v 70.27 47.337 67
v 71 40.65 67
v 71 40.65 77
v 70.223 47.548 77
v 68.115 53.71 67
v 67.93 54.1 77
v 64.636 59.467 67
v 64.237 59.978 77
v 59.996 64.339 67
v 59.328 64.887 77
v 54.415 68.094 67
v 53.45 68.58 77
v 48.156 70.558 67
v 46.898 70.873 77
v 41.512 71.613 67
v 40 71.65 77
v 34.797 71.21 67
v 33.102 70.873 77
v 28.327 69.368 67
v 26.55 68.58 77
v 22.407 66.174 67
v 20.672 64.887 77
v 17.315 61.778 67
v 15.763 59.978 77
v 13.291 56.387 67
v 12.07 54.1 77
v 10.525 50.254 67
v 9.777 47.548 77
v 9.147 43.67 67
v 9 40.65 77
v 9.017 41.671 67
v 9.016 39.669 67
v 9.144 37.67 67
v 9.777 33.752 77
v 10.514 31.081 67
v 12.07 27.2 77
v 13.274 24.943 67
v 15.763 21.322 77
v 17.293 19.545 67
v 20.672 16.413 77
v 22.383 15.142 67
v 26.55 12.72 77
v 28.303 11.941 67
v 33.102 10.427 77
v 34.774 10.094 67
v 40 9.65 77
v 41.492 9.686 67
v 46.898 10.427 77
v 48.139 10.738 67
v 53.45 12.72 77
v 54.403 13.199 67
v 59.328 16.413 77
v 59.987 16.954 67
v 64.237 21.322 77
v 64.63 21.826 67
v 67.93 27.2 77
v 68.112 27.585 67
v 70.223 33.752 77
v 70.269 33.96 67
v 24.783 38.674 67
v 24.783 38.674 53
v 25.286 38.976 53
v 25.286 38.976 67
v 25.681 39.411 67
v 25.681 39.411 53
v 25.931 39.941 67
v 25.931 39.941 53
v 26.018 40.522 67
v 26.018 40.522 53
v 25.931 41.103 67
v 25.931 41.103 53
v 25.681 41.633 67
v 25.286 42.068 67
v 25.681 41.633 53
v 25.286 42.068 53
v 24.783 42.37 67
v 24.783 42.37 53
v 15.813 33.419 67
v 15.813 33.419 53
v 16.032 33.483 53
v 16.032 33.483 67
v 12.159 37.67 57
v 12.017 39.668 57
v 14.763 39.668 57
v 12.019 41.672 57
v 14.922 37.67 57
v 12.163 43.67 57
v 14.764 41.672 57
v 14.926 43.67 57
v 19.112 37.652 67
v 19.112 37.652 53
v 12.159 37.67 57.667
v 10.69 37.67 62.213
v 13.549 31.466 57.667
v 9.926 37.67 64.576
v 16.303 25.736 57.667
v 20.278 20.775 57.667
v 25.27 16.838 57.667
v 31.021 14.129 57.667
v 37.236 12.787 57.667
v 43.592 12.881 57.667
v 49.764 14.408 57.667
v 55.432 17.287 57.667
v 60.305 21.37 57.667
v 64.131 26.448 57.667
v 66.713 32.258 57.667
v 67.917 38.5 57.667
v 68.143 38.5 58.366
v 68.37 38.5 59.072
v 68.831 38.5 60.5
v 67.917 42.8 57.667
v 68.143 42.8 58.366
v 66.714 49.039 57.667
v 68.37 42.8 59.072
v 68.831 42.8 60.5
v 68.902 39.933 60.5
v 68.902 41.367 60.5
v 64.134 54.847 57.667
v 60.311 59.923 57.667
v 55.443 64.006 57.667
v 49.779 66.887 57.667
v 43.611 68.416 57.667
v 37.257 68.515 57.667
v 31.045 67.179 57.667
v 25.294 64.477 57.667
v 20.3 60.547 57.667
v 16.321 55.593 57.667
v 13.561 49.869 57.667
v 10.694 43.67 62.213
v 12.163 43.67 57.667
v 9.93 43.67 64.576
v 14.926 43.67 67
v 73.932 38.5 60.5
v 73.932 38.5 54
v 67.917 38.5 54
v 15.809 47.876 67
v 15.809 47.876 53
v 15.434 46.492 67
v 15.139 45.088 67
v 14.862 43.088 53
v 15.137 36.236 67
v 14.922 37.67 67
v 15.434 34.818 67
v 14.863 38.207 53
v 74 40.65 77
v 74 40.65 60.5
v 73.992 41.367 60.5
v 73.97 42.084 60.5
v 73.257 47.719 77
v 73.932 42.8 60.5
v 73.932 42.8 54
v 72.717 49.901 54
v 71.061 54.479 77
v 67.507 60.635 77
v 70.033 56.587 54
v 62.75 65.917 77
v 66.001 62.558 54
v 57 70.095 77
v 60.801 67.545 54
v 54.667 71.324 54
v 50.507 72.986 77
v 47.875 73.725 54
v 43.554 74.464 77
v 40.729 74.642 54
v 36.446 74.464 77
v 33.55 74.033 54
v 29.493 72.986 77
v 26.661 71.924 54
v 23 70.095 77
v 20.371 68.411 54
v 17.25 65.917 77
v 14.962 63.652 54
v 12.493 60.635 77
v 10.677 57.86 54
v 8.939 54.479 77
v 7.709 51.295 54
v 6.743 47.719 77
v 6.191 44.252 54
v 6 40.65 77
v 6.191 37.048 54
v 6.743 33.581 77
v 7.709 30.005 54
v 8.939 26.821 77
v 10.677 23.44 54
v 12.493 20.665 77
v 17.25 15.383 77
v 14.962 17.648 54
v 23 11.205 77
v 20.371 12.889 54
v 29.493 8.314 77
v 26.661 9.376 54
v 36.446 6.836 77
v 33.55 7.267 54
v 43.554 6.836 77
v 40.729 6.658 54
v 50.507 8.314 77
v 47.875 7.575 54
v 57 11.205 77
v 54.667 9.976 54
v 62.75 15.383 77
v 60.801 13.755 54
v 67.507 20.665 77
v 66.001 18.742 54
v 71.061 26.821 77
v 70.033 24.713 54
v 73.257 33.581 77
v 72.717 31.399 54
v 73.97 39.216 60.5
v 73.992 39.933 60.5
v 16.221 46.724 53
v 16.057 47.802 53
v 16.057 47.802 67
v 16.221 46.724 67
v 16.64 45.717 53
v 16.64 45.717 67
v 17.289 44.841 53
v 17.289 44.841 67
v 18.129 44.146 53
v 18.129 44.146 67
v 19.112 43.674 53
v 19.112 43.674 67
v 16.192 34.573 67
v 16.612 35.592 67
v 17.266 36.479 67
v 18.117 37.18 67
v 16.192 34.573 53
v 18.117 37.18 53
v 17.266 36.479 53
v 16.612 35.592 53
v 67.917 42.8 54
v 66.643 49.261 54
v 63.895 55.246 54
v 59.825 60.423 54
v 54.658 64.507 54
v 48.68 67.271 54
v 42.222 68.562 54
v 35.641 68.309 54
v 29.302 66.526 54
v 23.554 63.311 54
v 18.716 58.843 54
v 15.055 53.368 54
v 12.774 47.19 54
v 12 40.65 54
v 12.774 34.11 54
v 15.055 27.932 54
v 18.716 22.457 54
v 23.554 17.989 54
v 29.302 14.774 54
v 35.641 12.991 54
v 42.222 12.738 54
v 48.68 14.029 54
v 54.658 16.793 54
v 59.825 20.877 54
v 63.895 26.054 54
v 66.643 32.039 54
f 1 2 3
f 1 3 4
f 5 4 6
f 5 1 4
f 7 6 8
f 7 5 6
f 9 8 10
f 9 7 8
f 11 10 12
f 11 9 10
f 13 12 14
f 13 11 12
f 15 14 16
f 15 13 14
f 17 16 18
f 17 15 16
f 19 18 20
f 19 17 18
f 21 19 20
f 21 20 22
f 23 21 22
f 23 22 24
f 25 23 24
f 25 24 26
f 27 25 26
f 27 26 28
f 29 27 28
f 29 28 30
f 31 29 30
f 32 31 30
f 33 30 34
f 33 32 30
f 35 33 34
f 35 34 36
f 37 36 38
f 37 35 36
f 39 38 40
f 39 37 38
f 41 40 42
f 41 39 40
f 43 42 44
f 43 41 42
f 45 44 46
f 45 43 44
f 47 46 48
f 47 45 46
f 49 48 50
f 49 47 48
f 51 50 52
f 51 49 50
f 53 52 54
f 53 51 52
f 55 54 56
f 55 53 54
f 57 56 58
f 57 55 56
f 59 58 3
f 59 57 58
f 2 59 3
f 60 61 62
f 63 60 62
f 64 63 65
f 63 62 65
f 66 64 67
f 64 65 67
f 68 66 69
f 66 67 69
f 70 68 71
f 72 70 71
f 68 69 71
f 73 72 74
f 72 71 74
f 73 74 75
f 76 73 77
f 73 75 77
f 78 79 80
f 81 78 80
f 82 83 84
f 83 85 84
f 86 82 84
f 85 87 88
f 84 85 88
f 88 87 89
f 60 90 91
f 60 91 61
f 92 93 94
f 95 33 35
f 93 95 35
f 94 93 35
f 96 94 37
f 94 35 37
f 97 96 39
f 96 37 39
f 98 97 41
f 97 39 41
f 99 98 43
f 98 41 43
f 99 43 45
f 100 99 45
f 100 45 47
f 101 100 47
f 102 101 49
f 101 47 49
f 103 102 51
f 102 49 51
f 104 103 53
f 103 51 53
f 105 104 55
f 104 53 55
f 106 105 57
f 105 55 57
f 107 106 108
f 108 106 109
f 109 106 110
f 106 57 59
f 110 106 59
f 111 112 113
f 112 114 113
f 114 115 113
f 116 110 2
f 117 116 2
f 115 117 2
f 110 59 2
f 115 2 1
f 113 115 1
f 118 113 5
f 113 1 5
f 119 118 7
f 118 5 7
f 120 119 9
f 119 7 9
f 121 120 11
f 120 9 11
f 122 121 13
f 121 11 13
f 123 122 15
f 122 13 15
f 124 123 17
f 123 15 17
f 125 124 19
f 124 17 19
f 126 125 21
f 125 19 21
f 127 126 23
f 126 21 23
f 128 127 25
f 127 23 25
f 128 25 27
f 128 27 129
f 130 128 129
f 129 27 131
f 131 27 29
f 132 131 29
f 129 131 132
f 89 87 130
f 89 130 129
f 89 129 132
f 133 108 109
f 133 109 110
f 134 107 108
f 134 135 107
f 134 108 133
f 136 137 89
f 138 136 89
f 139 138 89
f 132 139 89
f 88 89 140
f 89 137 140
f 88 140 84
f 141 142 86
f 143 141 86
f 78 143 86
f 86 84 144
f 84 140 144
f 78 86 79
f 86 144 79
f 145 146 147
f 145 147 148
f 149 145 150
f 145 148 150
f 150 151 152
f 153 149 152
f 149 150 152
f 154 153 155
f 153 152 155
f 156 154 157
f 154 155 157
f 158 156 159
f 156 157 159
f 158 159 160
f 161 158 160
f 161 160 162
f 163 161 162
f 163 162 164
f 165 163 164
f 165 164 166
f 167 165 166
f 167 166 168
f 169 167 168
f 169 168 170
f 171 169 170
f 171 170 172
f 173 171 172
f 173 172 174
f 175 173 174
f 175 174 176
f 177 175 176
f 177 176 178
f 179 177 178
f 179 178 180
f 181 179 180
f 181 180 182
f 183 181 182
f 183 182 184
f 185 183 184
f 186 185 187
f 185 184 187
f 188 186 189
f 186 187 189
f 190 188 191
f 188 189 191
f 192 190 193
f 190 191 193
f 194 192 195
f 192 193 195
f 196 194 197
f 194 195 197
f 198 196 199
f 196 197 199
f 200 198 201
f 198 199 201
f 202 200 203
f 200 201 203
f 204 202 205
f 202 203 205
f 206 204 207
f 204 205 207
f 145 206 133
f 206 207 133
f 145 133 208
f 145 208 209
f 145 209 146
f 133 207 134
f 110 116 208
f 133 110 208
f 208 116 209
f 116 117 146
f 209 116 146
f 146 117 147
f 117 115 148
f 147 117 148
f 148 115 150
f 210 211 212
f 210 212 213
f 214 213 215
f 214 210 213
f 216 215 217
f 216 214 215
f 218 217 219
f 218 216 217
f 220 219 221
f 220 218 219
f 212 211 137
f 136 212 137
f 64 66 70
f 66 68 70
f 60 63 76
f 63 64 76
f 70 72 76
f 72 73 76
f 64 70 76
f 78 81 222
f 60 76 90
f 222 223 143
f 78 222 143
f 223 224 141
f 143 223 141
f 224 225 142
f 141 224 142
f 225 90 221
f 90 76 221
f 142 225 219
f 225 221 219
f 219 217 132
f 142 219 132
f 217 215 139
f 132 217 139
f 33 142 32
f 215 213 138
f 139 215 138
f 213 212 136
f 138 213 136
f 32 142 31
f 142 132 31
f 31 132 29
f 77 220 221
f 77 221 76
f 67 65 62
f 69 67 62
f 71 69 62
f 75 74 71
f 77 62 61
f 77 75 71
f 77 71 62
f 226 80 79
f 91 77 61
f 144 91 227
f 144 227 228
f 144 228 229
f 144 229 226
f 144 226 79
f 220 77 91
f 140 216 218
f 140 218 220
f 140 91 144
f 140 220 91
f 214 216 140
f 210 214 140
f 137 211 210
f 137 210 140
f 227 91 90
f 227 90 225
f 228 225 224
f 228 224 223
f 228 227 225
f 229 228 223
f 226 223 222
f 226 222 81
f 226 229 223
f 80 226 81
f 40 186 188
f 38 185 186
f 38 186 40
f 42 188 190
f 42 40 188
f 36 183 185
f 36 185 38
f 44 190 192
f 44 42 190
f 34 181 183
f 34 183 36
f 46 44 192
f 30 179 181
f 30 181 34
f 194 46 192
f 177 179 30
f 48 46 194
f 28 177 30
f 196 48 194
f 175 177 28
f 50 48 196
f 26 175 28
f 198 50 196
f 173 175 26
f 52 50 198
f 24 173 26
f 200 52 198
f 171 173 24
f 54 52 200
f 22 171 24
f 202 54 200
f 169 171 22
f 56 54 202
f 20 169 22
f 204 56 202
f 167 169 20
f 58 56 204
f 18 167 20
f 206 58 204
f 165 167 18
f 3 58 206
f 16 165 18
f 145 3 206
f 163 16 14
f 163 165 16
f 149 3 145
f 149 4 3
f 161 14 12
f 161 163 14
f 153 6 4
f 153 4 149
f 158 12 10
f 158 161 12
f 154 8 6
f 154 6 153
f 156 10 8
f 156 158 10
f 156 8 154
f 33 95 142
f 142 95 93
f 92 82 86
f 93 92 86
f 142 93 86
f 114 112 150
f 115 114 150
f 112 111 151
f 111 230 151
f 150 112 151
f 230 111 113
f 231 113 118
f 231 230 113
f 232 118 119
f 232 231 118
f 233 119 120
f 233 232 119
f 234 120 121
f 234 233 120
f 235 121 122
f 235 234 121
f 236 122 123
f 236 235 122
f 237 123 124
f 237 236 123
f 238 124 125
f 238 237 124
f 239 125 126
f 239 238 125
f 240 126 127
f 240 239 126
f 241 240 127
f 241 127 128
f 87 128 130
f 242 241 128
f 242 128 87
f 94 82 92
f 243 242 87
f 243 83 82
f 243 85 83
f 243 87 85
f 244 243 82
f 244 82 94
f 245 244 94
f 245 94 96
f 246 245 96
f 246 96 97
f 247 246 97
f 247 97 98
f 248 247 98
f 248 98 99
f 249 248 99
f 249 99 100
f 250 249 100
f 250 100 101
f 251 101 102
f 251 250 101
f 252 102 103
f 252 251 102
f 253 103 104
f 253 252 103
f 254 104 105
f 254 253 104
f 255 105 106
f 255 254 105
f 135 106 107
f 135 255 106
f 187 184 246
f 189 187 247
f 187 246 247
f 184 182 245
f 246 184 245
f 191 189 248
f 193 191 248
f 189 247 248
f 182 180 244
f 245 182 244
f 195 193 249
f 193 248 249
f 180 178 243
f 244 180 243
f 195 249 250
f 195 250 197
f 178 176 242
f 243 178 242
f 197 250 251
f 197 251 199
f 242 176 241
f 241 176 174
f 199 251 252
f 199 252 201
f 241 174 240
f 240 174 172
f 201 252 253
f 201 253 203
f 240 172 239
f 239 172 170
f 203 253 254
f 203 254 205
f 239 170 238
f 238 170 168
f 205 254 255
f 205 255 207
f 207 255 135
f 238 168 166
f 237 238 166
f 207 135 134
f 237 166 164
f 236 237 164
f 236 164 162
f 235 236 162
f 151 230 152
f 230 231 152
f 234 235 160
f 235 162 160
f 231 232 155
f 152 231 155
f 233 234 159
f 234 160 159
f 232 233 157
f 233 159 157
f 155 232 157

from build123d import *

# Parameters (mm, degrees)
BOX013_W          = 14
BOX013_H          = 4.3
BOX013_DEPTH      = 10
CYLINDER021_R     = 28
CYLINDER021_DEPTH = 4
CYLINDER019_R     = 34
CYLINDER019_DEPTH = 13
CYLINDER020_R     = 25
CYLINDER020_DEPTH = 13
TUBE_R            = 34
TUBE_R_2          = 31
TUBE_DEPTH        = 23
EXTRUDE001_DEPTH  = 14
BOX012_W          = 10
BOX012_H          = 6
BOX012_DEPTH      = 10


with BuildPart() as cube013:
    # Box013 → Box013 (new body)
    with BuildSketch(Plane(origin=(64, 38.5, 50.5), x_dir=(1, 0, 0), z_dir=(0, 0, 1))):
        with Locations((7, 2.15)):
            Rectangle(BOX013_W, BOX013_H)
    extrude(amount=BOX013_DEPTH)


with BuildPart() as cylinder021:
    # Cylinder021 → Cylinder021 (new body)
    with BuildSketch(Plane(origin=(40, 40.65, 54), x_dir=(1, 0, 0), z_dir=(0, 0, 1))):
        Circle(CYLINDER021_R)
    extrude(amount=CYLINDER021_DEPTH)


with BuildPart() as cone:
    # Cone → Cone (revolve)
    with BuildSketch(Plane(origin=(40, 40.65, 53), x_dir=(1, 0, 0), z_dir=(0, -1, 0))):
        Polygon((0, 0), (26.5, 0), (31, 14), (0, 14), align=None)
    revolve(axis=Axis((40, 40.65, 53), (0, 0, 1)))


with BuildPart() as cylinder019:
    # Cylinder019 → Cylinder019 (new body)
    with BuildSketch(Plane(origin=(40, 40.65, 54), x_dir=(1, 0, 0), z_dir=(0, 0, 1))):
        Circle(CYLINDER019_R)
    extrude(amount=CYLINDER019_DEPTH)


with BuildPart() as cylinder020:
    # Cylinder020 → Cylinder020 (new body)
    with BuildSketch(Plane(origin=(40, 39.2, 54), x_dir=(1, 0, 0), z_dir=(0, 0, 1))):
        Circle(CYLINDER020_R)
    extrude(amount=CYLINDER020_DEPTH)


with BuildPart() as cut016:
    # Tube → Tube (new body)
    with BuildSketch(Plane(origin=(40, 40.65, 54), x_dir=(1, 0, 0), z_dir=(0, 0, 1))):
        Circle(TUBE_R)
        Circle(TUBE_R_2, mode=Mode.SUBTRACT)
    extrude(amount=TUBE_DEPTH)

    # Fusion010: union Cylinder019, Cylinder020
    add(cylinder019.part)
    add(cylinder020.part)

    # Cut015: cut Cone
    add(cone.part, mode=Mode.SUBTRACT)

    # Cut016: cut Cylinder021
    add(cylinder021.part, mode=Mode.SUBTRACT)


with BuildPart() as extrude001:
    # Sketch001 → Extrude001 (new body)
    with BuildSketch(Plane(origin=(0, 5, 65), x_dir=(1, 0, 0), z_dir=(0, 0, 1))):
        with BuildLine():
            ThreePointArc((16.057001, 41.301956), (16.937891, 38.759239), (19.112253, 37.173829))
            Line((19.112253, 37.173829), (24.78314, 35.869707))
            ThreePointArc((24.78314, 32.174329), (26.017604, 34.022018), (24.78314, 35.869707))
            Line((19.112253, 31.152458), (24.78314, 32.174329))
            ThreePointArc((19.112253, 31.152458), (16.911676, 29.555757), (16.032372, 26.983051))
            Line((15.813344, 26.918672), (16.032372, 26.983051))
            ThreePointArc((15.808908, 41.376289), (14.743203, 34.147153), (15.813344, 26.918672))
            Line((16.057001, 41.301956), (15.808908, 41.376289))
        make_face()
    extrude(amount=EXTRUDE001_DEPTH)


with BuildPart() as extrude001_1:
    # Extrude001 placement: moved
    add(extrude001.part.moved(Location((0, 0, 7))))


with BuildPart() as lid:
    # Box012 → Box012 (new body)
    with BuildSketch(Plane(origin=(7, 36.17, 76), x_dir=(1, 0, 0), z_dir=(0, 0, 1))):
        with Locations((5, 3)):
            Rectangle(BOX012_W, BOX012_H)
    extrude(amount=BOX012_DEPTH)

    # Fusion006: union Extrude001
    add(extrude001_1.part)


with BuildPart() as lid_1:
    # Fusion006 placement: moved
    add(lid.part.moved(Location((0, 1.5, -19))))

    # Fusion024: union Cut016
    add(cut016.part)

    # Cut017: cut Cube013
    add(cube013.part, mode=Mode.SUBTRACT)


solid = lid_1.part
